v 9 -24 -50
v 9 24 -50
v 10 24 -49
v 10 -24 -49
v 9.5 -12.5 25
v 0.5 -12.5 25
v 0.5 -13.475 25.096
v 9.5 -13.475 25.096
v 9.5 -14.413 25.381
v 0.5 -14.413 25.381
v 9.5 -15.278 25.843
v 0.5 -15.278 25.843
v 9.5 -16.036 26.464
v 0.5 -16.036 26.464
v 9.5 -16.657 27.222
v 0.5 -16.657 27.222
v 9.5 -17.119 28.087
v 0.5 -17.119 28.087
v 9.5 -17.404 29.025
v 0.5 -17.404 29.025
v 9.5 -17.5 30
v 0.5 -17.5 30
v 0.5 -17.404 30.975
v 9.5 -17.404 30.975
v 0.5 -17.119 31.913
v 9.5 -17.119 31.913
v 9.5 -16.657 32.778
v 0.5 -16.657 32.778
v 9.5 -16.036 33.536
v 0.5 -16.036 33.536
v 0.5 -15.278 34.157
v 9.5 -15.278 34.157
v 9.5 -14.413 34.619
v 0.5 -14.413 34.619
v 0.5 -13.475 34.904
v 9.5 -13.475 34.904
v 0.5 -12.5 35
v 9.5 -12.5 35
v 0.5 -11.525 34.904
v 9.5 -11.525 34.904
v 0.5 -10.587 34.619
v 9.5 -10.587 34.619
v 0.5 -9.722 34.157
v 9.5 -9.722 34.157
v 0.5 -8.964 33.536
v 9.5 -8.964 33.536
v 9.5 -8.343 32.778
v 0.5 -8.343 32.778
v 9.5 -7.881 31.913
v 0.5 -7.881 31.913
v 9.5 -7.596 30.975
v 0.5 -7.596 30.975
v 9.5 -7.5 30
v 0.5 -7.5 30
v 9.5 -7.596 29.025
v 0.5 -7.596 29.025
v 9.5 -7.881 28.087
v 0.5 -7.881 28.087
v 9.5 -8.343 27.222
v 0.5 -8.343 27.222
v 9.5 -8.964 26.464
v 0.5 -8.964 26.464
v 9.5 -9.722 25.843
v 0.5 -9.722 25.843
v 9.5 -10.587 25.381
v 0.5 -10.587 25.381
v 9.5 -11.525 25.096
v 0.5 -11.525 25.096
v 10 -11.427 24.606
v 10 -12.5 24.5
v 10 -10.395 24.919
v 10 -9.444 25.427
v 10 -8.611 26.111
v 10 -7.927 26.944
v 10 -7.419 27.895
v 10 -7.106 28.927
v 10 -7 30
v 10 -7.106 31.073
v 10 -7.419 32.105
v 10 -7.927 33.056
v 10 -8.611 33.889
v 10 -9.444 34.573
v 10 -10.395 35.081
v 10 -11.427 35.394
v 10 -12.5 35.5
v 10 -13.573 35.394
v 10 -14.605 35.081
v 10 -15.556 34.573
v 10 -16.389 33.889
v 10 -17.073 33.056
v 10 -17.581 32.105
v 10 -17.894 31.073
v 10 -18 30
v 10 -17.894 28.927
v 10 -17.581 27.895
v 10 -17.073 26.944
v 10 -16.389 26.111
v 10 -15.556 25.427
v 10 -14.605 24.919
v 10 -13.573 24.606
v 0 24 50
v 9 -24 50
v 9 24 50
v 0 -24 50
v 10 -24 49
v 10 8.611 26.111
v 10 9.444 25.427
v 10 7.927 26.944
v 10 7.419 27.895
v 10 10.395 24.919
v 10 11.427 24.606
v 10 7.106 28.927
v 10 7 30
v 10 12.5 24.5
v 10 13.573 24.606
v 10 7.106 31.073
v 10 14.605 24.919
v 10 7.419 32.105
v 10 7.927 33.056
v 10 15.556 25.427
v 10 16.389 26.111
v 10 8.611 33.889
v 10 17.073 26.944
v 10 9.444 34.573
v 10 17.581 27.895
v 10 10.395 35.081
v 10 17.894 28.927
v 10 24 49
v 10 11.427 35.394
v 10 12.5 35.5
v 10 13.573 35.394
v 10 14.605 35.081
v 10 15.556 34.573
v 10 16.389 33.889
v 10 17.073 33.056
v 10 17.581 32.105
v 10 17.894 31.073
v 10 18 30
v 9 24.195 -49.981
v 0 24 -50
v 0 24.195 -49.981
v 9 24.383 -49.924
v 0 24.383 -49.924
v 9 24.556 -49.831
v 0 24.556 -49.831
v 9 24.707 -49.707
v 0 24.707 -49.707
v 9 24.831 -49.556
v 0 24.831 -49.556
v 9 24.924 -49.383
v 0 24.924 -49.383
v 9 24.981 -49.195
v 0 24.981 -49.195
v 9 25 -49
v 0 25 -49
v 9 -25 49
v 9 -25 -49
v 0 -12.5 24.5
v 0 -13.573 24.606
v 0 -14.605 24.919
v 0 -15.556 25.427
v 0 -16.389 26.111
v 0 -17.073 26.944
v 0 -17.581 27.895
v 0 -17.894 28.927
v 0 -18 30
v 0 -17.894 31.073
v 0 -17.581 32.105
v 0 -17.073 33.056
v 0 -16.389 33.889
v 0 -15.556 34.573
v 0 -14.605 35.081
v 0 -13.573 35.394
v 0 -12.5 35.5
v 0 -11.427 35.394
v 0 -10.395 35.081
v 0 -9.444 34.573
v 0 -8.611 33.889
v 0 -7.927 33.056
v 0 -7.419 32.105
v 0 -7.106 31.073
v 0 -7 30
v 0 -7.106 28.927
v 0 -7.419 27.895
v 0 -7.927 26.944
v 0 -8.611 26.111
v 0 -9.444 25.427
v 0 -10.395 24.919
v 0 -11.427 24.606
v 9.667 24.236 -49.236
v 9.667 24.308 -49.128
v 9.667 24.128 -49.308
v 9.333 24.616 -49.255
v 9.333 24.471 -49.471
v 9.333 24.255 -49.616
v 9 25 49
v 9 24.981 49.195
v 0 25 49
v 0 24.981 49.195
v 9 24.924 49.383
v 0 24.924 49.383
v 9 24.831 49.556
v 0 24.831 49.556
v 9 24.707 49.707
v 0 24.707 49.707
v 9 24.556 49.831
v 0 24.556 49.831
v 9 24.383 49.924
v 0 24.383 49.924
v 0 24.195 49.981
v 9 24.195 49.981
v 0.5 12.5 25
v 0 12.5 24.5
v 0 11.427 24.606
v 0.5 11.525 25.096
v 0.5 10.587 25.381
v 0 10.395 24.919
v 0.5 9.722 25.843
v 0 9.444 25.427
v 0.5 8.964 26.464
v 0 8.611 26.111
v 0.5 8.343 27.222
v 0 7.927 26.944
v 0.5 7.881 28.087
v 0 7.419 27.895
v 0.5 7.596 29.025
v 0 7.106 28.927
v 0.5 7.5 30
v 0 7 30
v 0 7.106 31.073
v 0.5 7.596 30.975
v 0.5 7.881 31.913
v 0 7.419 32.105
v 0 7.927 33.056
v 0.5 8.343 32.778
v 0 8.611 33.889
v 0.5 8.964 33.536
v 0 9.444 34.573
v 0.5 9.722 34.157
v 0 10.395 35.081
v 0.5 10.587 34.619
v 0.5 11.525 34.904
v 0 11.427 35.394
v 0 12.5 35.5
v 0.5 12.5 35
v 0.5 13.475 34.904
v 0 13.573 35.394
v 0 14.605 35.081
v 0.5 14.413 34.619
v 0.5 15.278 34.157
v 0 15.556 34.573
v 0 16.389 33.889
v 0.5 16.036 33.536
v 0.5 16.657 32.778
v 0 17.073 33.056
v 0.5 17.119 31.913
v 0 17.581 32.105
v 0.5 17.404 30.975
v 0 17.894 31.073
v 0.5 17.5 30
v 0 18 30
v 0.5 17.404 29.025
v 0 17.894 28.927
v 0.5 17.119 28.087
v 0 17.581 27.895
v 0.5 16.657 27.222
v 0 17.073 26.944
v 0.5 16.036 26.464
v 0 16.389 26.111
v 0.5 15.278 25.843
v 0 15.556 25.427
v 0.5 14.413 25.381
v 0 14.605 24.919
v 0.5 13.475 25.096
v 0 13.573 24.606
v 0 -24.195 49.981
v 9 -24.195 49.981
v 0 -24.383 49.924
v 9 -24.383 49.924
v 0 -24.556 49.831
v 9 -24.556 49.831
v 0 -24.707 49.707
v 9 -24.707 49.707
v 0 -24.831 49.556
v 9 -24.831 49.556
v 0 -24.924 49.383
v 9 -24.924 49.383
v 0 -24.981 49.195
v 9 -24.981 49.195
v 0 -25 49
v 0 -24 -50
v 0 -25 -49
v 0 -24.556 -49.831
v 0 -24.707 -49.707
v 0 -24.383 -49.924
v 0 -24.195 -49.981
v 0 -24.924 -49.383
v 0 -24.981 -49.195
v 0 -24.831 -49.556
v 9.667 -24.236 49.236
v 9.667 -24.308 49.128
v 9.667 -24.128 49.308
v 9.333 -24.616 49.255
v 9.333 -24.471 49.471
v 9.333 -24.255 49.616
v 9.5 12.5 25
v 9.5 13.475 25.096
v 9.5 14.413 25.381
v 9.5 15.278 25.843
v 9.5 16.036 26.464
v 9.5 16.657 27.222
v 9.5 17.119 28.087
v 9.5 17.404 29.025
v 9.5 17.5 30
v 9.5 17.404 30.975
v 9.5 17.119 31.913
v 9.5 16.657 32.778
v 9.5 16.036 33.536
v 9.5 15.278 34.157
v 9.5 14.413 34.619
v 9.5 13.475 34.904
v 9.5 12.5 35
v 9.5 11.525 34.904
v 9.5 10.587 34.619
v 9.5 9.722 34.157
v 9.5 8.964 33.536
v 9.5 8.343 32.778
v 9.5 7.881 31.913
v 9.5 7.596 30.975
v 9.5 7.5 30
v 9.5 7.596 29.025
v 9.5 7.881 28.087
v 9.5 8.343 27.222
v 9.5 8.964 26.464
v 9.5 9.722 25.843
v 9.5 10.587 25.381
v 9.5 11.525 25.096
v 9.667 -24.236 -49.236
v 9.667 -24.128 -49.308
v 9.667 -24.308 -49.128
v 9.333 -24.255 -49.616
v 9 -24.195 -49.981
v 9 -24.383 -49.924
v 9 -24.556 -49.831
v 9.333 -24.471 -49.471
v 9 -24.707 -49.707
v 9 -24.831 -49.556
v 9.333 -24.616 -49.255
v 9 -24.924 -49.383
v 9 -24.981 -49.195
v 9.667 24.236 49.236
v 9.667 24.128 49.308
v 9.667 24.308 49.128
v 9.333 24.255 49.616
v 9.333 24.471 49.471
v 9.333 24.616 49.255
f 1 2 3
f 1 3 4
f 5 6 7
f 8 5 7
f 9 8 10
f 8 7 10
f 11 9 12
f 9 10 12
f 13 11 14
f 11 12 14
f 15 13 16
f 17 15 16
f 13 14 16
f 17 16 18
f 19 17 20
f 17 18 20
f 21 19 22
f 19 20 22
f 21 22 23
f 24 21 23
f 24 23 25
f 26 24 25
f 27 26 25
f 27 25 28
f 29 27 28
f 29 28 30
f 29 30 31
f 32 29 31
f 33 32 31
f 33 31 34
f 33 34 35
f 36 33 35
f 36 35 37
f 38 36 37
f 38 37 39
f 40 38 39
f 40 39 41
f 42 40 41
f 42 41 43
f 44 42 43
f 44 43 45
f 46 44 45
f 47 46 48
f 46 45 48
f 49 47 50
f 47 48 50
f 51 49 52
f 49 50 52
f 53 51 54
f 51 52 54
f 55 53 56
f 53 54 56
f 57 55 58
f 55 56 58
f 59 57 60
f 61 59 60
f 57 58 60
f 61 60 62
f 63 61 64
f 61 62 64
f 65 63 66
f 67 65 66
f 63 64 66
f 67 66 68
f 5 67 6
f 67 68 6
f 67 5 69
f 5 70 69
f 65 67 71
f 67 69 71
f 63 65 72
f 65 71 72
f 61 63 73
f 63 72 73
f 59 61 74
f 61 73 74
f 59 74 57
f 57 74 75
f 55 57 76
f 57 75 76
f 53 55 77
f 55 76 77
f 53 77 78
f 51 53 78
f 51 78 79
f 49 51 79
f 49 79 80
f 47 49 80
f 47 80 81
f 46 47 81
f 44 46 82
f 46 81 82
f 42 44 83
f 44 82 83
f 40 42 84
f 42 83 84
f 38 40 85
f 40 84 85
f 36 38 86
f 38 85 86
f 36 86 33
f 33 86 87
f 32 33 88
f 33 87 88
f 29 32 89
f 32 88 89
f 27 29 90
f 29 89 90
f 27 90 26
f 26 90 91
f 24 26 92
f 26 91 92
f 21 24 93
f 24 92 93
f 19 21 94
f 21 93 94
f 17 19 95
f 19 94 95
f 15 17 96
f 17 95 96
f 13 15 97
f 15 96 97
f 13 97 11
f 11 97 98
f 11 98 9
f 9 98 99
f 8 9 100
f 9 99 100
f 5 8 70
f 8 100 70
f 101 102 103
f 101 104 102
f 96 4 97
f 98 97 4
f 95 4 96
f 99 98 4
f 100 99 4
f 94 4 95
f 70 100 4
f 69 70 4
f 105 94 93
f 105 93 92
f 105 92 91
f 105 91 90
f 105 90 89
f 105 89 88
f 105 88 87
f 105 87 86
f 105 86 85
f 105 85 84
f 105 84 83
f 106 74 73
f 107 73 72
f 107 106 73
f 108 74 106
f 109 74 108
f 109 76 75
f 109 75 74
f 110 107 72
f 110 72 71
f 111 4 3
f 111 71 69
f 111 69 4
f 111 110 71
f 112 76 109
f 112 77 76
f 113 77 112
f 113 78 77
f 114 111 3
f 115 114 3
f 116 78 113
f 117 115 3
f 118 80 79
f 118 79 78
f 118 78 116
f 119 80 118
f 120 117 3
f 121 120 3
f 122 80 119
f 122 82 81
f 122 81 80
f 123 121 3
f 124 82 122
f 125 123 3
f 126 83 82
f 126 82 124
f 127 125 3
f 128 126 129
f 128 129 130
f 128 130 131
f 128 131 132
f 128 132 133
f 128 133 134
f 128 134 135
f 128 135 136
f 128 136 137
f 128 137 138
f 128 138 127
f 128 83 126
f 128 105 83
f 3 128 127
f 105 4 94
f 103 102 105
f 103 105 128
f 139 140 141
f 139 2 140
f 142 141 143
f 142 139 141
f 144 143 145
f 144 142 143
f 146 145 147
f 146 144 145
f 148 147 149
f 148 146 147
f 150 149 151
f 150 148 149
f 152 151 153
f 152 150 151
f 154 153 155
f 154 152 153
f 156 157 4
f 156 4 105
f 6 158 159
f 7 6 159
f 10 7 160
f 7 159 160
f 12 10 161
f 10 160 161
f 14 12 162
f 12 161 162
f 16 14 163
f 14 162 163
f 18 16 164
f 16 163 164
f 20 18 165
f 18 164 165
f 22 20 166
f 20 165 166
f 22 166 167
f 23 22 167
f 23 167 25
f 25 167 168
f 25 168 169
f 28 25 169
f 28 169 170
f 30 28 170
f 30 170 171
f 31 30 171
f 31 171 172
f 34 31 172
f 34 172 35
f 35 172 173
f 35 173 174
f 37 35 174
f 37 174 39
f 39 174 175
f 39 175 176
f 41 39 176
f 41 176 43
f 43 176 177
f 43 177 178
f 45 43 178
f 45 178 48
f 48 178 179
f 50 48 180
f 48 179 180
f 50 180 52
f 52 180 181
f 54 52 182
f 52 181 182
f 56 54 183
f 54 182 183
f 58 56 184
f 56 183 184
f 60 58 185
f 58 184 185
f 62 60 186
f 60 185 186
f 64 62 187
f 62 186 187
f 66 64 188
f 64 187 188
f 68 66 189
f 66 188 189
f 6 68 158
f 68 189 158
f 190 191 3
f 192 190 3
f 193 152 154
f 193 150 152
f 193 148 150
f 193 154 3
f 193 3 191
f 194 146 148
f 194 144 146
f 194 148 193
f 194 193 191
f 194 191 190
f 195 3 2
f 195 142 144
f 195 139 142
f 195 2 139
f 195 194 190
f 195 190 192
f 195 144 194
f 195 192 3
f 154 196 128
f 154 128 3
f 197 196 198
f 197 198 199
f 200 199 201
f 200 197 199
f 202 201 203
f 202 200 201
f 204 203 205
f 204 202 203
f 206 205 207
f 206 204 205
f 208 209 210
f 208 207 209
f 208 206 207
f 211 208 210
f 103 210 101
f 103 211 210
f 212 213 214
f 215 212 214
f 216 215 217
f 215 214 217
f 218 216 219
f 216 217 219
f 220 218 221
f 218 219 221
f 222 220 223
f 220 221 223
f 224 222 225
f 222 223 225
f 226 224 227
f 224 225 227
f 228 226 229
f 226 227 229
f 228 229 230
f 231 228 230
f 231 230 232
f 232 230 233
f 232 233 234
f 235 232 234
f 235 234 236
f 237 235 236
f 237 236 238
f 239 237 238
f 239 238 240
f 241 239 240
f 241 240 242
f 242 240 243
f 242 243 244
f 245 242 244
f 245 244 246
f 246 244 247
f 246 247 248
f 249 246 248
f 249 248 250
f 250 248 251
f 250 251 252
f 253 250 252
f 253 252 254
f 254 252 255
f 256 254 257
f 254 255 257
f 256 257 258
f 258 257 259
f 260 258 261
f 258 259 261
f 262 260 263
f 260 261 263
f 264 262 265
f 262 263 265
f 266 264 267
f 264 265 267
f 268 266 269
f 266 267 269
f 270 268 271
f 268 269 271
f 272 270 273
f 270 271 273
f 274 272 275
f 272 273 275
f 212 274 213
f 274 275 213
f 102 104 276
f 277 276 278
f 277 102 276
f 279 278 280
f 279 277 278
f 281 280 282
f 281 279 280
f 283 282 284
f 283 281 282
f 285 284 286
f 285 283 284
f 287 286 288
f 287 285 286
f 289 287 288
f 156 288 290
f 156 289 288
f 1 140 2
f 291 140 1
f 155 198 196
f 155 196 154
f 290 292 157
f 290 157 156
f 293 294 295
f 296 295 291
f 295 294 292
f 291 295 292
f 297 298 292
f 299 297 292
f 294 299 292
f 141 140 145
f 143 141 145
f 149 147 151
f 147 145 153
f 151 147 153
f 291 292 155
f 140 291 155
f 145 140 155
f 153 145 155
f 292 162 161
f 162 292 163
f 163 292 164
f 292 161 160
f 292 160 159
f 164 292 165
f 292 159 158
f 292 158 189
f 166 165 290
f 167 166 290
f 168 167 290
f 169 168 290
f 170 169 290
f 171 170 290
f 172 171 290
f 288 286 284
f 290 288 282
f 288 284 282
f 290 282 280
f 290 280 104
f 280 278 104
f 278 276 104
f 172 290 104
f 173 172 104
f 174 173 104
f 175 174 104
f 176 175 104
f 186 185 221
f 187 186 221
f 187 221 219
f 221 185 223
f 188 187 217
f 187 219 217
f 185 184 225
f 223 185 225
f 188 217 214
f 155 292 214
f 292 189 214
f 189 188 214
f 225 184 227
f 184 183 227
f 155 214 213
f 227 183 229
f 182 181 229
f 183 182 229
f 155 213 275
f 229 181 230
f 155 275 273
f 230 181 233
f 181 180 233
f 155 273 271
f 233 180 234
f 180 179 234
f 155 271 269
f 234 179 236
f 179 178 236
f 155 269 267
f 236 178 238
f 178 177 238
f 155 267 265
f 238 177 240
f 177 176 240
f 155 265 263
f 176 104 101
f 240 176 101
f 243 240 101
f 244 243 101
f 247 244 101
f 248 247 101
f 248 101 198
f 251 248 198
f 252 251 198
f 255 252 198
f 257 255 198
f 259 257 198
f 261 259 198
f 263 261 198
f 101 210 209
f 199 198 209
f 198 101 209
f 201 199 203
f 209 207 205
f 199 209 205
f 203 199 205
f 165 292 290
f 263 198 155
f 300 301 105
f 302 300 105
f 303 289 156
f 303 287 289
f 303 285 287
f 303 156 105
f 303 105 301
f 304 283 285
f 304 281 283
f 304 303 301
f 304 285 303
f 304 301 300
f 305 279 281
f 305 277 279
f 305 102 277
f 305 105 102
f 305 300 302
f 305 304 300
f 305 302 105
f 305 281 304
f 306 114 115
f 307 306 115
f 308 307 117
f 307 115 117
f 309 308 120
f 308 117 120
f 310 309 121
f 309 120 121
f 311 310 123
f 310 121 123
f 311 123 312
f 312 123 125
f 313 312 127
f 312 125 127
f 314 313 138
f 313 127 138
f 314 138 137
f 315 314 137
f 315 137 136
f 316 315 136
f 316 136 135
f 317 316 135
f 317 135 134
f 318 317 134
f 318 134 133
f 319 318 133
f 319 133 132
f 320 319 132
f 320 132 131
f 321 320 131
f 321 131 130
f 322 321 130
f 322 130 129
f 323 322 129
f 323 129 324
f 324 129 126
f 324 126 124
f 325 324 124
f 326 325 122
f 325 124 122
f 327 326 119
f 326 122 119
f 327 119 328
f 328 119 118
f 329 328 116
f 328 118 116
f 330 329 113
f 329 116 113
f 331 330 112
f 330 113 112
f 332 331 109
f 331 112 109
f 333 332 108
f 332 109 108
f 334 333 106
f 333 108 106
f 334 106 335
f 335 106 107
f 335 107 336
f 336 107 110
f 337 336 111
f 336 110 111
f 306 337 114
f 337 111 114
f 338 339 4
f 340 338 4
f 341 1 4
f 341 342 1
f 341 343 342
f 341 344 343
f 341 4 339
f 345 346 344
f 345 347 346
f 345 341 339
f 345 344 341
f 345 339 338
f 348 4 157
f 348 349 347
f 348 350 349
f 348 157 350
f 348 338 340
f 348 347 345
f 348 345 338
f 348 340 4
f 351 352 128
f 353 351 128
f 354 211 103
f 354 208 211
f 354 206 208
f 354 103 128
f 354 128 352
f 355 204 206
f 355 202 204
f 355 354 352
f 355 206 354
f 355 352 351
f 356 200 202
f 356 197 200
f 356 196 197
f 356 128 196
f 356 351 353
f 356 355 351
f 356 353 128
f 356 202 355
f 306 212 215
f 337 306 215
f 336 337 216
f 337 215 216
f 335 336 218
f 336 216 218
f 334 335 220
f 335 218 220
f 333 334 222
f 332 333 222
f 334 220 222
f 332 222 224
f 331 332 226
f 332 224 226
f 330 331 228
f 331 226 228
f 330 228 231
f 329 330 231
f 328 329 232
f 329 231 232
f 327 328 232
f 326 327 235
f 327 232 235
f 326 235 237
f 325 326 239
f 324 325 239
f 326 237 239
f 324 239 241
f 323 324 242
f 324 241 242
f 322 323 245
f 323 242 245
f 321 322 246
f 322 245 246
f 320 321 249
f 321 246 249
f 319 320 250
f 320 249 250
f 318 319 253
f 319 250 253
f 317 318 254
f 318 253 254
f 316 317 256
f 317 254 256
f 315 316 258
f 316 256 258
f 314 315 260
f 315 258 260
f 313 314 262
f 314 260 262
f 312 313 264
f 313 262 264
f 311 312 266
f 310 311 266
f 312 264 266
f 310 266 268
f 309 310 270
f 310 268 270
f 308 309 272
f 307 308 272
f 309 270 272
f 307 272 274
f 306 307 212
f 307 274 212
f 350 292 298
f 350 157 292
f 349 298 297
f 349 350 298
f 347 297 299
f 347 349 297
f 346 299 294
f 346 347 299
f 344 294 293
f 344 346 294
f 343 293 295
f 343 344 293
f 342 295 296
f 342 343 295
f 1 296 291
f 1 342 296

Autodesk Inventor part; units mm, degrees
ref_plane "YZ Plane" through (0, 0, 0) normal (1, 0, 0) x (0, 1, 0)
ref_plane "XZ Plane" through (0, 0, 0) normal (0, 1, 0) x (-1, 0, 0)
ref_plane "XY Plane" through (0, 0, 0) normal (0, 0, 1) x (1, 0, 0)
sketch "草圖1" plane through (0, 0, 0) normal (1, 0, 0) x (0, 1, 0)
  line L0 (-35, 0) -> (35, 0) projected
  line L1 (0, -70) -> (0, 70) projected
  line L2 (-25, 50) -> (25, 50)
  line L3 (25, 50) -> (25, -50)
  line L4 (25, -50) -> (-25, -50)
  line L5 (-25, -50) -> (-25, 50)
  line L6 (-25, 50) -> (25, -50) construction
  line L7 (25, 50) -> (-25, -50) construction
  point P0 (0, 0)
  dimension "d0" = 50
  dimension "d1" = 100
extrude "擠出1" add sketch "草圖1" along normal blind 10
fillet "圓角1" radius 1 4 edges at (5, 25, 50) (5, -25, 50) (5, -25, -50) (5, 25, -50)
chamfer "倒角1" distance 1 angle 45 8 edges at (10, 0, 50) (10, -24.7071, 49.7071) (10, -25, 0) (10, -24.7071, -49.7071) (10, 0, -50) (10, 24.7071, -49.7071) (10, 25, 0) (10, 24.7071, 49.7071)
sketch "草圖2" plane through (10, 0, 0) normal (1, 0, 0) x (0, 0, -1)
  line L0 (-50, 24) -> (-50, -24) projected
  line L1 (-30, 24) -> (-30, -24)
  line L2 (0, -35) -> (0, 35) projected
  line L3 (70, 0) -> (-70, 0) projected
  line L4 (70, 12.5) -> (-70, 12.5)
  line L5 (70, -12.5) -> (-70, -12.5)
  point P0 (0, 0)
  point P1 (-30, 12.5)
  point P2 (-30, -12.5)
  dimension "d8" = 20
  dimension "d9" = 12.5
  dimension "d10" = 12.5
hole "孔1" at (10, 12.5, 30) at (10, -12.5, 30) direction (-1, 0, 0) diameter 10 end through all
thread "螺紋1" size "M10x1.25" class "6H" standard "ANSI Metric M Profile" full length
thread "螺紋2" size "M10x1.5" class "6H" standard "ANSI Metric M Profile" full length
chamfer "倒角2" distance 0.5 angle 45 4 edges at (10, -12.5, 35) (10, 12.5, 35) (0, -12.5, 35) (0, 12.5, 35)
properties part number "exercise3-4"
